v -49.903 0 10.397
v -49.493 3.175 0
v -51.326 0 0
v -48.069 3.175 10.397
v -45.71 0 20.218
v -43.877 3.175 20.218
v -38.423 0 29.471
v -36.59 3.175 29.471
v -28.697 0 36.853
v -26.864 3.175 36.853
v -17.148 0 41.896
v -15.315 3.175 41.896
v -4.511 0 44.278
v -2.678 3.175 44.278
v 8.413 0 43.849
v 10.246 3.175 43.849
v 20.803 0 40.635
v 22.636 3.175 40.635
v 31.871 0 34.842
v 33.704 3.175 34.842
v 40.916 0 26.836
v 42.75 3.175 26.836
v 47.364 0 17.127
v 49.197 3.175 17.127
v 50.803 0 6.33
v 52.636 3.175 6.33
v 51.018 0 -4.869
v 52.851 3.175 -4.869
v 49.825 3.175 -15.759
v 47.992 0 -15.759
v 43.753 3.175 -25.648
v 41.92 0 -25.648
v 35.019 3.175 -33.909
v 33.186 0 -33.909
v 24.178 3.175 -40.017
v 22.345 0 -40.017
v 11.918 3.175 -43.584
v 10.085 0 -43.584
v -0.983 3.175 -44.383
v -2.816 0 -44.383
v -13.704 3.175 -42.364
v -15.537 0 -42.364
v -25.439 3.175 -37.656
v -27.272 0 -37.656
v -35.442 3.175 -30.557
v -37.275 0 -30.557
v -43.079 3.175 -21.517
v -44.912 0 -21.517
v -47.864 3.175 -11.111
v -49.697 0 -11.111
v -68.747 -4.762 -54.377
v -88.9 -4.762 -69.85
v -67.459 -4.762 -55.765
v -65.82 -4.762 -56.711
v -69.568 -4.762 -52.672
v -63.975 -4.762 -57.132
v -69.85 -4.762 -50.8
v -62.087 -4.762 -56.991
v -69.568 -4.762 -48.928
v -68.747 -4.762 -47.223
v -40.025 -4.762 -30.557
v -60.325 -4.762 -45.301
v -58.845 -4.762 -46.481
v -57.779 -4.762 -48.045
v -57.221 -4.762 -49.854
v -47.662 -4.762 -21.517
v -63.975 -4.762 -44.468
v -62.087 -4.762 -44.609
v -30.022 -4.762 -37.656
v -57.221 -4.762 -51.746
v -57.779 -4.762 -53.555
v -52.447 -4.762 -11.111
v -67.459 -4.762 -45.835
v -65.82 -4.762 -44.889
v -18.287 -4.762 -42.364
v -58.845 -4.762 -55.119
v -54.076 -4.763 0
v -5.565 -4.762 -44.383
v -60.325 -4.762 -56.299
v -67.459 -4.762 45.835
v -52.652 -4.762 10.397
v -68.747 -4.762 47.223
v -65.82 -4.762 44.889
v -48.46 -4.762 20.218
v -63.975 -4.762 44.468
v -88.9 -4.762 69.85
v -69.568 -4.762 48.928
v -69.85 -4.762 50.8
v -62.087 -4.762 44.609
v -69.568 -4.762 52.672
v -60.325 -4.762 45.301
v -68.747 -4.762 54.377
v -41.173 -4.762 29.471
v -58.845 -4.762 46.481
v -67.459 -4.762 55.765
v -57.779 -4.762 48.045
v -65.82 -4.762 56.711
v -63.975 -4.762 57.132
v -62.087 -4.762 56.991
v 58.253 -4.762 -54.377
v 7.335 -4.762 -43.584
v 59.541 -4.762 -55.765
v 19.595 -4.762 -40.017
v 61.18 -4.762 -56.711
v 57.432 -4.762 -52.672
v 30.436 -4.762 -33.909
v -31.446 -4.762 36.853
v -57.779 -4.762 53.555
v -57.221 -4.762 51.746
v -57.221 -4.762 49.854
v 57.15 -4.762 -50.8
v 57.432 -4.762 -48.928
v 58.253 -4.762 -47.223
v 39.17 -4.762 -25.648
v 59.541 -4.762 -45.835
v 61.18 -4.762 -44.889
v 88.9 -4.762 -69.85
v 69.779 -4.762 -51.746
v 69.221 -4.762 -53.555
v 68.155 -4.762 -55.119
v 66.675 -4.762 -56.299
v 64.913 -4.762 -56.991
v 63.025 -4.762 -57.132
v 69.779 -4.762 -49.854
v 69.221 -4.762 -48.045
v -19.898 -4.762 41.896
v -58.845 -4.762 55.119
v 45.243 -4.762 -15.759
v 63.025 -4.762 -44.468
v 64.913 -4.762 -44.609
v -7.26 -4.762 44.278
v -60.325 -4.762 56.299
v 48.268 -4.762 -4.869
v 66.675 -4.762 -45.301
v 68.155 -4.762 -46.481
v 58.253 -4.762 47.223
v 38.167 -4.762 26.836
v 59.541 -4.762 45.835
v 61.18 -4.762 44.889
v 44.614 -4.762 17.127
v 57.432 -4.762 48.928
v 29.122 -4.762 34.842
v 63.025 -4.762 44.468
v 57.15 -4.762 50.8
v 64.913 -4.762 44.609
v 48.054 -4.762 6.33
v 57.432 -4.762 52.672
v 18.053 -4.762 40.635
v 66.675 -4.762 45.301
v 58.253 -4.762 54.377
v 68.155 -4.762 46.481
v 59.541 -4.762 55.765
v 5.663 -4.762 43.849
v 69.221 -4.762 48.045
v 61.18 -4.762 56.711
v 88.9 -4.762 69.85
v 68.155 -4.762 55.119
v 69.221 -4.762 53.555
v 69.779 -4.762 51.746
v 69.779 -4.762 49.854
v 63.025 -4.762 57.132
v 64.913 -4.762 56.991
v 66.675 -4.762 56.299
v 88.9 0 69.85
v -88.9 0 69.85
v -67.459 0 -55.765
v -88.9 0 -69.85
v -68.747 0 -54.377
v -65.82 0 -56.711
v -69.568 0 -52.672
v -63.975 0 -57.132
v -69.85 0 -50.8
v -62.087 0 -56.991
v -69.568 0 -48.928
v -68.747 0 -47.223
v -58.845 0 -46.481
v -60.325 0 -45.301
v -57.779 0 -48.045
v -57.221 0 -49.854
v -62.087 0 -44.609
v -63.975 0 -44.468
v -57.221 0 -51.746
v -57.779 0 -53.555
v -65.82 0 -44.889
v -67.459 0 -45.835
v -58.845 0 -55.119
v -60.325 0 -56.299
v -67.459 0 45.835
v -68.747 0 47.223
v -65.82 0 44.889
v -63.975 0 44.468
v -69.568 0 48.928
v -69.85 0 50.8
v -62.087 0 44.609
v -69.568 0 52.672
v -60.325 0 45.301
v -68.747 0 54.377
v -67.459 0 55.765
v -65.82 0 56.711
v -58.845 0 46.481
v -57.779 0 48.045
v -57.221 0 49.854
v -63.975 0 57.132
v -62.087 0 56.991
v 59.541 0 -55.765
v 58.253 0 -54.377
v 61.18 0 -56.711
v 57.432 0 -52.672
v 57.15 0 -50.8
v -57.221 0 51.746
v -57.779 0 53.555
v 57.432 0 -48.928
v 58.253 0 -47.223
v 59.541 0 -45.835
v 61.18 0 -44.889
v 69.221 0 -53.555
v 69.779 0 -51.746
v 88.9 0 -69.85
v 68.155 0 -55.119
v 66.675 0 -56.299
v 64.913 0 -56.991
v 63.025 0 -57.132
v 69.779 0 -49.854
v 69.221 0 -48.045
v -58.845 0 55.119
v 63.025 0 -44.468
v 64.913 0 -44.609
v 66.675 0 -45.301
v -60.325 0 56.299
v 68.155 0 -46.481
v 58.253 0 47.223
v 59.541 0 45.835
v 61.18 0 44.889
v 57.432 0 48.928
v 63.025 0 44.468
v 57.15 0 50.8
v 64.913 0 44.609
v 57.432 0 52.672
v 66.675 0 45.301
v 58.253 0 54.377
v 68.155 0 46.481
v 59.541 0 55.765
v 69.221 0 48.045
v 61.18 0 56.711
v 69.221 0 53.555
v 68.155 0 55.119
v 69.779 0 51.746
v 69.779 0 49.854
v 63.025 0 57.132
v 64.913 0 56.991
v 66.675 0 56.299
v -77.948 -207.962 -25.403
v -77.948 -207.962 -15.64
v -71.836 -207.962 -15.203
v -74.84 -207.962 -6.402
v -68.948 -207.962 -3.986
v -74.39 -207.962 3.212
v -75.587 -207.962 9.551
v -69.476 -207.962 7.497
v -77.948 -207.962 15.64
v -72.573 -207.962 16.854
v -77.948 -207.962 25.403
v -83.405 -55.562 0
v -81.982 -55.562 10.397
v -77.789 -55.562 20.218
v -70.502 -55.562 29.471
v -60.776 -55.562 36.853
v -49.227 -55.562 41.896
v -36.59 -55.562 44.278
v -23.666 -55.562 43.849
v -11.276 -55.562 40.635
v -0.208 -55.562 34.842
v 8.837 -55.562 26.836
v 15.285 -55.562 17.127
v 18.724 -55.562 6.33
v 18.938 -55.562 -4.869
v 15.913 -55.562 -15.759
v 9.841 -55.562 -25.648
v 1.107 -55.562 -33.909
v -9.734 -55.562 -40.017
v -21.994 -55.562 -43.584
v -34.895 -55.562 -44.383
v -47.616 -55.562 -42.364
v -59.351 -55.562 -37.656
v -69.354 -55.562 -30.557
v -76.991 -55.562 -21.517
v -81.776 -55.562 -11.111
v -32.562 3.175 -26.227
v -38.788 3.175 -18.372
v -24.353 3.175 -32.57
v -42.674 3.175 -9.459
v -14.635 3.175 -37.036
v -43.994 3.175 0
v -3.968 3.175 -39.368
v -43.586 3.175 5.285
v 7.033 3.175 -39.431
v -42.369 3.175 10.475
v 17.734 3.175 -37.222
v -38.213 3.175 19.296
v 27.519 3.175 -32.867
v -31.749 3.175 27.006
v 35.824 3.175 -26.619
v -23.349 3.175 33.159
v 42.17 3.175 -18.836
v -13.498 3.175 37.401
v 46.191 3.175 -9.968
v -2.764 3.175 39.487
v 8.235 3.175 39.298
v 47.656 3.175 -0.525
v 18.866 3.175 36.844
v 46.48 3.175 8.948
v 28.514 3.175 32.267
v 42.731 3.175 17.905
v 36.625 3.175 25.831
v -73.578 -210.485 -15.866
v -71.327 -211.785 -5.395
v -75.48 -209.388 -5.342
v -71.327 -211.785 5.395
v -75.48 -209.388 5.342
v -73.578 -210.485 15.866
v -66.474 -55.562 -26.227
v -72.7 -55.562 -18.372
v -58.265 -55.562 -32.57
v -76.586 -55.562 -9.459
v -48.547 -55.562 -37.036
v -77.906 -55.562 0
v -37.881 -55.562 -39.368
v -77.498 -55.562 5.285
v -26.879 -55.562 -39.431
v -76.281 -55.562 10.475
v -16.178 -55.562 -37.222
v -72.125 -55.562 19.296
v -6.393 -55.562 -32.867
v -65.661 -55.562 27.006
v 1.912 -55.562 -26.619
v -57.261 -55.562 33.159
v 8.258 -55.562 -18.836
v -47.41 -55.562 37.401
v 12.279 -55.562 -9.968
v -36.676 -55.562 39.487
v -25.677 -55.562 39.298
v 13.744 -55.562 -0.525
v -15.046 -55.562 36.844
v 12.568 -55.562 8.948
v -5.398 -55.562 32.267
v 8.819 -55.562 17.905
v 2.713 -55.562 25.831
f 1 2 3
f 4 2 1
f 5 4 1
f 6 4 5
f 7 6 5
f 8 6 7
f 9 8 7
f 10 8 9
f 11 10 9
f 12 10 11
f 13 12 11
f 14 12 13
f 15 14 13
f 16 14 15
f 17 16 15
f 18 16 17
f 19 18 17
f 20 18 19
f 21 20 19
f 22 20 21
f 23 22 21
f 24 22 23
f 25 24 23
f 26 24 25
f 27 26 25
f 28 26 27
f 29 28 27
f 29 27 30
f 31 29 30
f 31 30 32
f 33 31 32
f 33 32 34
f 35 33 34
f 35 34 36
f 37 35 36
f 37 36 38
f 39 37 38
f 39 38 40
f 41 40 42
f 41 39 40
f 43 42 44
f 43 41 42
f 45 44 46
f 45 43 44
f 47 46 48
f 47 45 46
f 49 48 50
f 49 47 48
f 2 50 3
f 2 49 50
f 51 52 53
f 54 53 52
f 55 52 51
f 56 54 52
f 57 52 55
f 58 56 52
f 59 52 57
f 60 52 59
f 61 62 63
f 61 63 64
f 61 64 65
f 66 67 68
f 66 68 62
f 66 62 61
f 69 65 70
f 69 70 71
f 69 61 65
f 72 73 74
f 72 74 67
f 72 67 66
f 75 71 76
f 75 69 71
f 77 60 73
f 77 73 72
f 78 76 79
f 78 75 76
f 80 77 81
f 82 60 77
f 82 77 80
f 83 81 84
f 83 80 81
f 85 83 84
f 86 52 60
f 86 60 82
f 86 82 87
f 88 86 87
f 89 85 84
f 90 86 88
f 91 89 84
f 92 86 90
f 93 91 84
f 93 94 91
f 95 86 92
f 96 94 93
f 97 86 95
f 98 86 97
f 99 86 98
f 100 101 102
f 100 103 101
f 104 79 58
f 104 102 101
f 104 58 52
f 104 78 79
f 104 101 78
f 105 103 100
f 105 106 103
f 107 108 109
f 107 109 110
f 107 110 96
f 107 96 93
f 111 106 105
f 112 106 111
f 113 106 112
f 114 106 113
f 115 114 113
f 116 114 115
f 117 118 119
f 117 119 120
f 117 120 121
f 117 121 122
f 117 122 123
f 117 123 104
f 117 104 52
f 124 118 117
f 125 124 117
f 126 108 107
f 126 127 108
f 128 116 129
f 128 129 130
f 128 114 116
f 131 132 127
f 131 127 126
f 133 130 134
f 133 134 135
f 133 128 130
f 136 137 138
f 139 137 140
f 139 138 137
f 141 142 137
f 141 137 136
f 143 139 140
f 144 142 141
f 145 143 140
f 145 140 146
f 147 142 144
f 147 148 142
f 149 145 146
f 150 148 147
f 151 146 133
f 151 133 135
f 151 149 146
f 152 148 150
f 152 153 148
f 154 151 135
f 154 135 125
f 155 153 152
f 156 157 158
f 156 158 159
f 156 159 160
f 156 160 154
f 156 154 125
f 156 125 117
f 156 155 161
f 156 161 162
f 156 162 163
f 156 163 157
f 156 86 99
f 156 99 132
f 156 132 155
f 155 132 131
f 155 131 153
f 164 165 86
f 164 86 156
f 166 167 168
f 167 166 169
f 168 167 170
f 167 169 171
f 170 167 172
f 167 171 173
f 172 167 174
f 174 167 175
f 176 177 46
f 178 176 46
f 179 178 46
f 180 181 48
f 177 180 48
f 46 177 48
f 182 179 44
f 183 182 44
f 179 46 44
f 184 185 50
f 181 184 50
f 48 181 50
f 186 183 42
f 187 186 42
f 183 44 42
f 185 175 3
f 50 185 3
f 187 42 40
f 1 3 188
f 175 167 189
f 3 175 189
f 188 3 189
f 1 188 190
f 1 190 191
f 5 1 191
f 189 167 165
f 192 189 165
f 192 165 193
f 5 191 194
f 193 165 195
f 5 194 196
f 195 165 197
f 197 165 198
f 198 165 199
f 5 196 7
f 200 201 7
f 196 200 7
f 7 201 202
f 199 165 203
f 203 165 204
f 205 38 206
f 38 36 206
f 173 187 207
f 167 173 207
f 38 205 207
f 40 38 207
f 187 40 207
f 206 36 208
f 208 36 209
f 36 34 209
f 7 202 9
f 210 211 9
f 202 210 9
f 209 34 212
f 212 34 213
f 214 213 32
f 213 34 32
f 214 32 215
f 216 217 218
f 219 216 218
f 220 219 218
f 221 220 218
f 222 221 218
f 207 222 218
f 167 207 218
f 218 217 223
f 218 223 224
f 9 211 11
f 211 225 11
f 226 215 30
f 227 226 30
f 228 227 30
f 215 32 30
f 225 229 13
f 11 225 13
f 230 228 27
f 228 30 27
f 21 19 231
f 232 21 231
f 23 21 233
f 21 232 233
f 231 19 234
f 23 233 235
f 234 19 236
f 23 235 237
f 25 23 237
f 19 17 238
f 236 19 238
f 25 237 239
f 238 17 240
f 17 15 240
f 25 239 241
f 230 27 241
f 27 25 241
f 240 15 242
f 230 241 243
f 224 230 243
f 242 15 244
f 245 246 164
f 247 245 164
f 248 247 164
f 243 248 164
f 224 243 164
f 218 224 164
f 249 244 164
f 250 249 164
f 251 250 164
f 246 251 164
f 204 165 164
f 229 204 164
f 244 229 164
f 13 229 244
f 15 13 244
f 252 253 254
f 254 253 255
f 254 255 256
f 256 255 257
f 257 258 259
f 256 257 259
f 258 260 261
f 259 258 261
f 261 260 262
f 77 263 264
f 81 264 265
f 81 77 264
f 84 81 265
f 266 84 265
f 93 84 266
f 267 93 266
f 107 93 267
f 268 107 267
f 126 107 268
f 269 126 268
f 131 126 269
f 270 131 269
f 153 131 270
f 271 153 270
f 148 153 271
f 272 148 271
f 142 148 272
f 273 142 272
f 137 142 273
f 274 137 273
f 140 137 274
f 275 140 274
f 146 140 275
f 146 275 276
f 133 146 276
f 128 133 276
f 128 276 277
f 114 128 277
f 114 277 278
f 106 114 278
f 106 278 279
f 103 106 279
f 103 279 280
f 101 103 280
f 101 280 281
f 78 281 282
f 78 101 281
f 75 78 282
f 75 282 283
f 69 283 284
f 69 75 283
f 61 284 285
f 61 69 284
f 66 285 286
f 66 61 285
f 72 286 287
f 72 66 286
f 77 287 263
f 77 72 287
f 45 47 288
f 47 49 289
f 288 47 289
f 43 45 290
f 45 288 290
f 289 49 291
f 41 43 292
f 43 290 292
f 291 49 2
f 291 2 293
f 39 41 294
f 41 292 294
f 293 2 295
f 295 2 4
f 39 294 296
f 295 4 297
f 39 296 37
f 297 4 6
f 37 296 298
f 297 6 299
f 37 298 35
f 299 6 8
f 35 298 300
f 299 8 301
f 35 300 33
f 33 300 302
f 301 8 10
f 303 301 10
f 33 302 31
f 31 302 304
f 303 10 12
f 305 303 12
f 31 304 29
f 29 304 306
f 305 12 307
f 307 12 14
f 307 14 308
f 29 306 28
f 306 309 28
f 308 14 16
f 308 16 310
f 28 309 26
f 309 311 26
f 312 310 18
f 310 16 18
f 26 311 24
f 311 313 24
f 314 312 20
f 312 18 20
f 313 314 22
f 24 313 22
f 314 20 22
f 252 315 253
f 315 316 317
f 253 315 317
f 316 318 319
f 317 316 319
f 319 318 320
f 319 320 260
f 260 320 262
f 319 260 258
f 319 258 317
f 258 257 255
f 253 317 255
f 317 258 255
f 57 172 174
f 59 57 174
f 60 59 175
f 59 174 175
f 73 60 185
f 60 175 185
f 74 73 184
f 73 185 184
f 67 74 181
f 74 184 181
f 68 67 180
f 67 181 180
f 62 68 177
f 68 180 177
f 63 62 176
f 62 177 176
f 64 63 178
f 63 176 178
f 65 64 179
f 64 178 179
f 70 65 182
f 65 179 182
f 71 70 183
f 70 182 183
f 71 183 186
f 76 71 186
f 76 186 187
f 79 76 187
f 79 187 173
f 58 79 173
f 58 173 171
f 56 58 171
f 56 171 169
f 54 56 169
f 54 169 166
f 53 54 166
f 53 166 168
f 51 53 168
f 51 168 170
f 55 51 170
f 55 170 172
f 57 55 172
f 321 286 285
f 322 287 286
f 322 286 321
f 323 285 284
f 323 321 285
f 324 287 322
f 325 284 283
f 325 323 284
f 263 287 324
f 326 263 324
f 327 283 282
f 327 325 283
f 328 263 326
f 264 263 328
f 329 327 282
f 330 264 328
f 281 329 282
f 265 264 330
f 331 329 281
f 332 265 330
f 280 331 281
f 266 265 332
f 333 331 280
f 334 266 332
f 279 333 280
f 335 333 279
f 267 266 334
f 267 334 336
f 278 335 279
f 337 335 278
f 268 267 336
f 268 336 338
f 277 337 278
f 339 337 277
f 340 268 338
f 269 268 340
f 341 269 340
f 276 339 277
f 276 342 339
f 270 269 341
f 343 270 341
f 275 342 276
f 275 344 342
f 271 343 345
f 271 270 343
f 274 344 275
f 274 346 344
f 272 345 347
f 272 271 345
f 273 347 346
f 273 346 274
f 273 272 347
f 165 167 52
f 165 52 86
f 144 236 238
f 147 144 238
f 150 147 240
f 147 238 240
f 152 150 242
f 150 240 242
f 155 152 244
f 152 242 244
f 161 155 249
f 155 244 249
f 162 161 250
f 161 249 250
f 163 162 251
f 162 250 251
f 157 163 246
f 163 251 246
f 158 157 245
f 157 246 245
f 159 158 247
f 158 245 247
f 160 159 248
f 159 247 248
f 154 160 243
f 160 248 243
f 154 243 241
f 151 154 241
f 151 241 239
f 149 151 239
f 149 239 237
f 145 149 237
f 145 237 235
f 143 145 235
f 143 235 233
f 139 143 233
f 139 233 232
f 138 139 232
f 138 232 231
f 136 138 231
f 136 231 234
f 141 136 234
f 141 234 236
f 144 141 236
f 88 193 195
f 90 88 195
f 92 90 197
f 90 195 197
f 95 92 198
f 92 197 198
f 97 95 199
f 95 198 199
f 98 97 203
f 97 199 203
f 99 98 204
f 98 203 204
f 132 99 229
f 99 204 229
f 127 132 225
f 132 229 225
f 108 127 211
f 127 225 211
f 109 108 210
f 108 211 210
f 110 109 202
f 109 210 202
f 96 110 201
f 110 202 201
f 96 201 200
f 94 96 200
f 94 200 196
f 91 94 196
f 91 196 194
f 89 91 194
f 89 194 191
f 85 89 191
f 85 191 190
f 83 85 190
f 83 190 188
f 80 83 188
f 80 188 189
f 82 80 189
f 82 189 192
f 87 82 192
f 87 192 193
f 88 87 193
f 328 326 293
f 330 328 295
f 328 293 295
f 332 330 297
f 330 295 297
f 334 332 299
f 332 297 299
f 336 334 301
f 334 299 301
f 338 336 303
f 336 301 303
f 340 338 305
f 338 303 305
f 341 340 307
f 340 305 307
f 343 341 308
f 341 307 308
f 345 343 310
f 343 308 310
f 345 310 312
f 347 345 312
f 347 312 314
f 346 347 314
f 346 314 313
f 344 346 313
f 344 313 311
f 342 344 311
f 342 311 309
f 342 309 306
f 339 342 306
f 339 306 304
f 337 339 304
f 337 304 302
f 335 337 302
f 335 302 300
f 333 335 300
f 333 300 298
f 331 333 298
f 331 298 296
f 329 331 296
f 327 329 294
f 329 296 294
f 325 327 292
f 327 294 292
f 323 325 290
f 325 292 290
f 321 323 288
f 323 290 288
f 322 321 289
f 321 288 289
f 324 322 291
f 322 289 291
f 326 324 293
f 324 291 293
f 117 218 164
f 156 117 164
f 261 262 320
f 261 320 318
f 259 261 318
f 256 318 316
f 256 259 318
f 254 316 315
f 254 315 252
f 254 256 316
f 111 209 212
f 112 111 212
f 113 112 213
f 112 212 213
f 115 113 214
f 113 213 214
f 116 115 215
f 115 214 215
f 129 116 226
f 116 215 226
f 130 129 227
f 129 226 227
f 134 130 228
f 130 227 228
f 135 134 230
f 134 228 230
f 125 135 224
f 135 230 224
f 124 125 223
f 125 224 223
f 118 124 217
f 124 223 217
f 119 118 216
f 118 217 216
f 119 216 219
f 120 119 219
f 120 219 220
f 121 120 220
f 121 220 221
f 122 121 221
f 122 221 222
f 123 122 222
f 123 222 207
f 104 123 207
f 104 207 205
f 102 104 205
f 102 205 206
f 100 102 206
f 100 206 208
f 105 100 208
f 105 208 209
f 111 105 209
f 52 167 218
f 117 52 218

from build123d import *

# Parameters (mm, degrees)
F0_W      = 177.8
F0_H      = 139.7
F1_DEPTH  = 4.7625
F4_R      = 44.45
F5_DEPTH  = 254
F6_R      = 39.6875
F7_DEPTH  = 292.4958291982
F8_W      = 177.8
F8_H      = 76.2
F9_DEPTH  = 50.8
F10_R     = 6.35
F11_DEPTH = 211.9505153341
F12_W     = 279.4
F12_H     = 152.4
F13_DEPTH = 44.577


with BuildPart() as f1:
    # F0 (on Front) → F1 (new body)
    with BuildSketch(Plane.XZ):
        Rectangle(F0_W, F0_H)
    extrude(amount=F1_DEPTH)

    # F4 (on face) → F5 (join)
    with BuildSketch(Plane(origin=(17.4625, 30.2459372272, 0), x_dir=(-0.8660254038, 0.5, 0), z_dir=(0.5, 0.8660254038, 0))):
        Circle(F4_R)
    extrude(amount=-F5_DEPTH)

    # F6 (on face) → F7 (cut, through all)
    with BuildSketch(Plane(origin=(17.4625, 30.2459372272, 0), x_dir=(-0.8660254038, 0.5, 0), z_dir=(0.5, 0.8660254038, 0))):
        Circle(F6_R)
    extrude(amount=-F7_DEPTH, mode=Mode.SUBTRACT)

    # F8 (on Top) → F9 (cut, symmetric)
    with BuildSketch(Plane.XY):
        with Locations((0, 41.275)):
            Rectangle(F8_W, F8_H)
    extrude(amount=F9_DEPTH, both=True, mode=Mode.SUBTRACT)

    # F10 (on face) → F11 (cut, through all)
    with BuildSketch(Plane(origin=(0, 0, 0), x_dir=(-1, 0, 0), z_dir=(0, 1, 0))):
        with Locations((63.5, 50.8)):
            Circle(F10_R)
        with Locations((-63.5, 50.8)):
            Circle(F10_R)
        with Locations((63.5, -50.8)):
            Circle(F10_R)
        with Locations((-63.5, -50.8)):
            Circle(F10_R)
    extrude(amount=-F11_DEPTH, mode=Mode.SUBTRACT)

    # F12 (on Top) → F13 (cut, symmetric)
    with BuildSketch(Plane.XY):
        with Locations((-50.8, -131.7625)):
            Rectangle(F12_W, F12_H)
    extrude(amount=F13_DEPTH, both=True, mode=Mode.SUBTRACT)


solid = f1.part
